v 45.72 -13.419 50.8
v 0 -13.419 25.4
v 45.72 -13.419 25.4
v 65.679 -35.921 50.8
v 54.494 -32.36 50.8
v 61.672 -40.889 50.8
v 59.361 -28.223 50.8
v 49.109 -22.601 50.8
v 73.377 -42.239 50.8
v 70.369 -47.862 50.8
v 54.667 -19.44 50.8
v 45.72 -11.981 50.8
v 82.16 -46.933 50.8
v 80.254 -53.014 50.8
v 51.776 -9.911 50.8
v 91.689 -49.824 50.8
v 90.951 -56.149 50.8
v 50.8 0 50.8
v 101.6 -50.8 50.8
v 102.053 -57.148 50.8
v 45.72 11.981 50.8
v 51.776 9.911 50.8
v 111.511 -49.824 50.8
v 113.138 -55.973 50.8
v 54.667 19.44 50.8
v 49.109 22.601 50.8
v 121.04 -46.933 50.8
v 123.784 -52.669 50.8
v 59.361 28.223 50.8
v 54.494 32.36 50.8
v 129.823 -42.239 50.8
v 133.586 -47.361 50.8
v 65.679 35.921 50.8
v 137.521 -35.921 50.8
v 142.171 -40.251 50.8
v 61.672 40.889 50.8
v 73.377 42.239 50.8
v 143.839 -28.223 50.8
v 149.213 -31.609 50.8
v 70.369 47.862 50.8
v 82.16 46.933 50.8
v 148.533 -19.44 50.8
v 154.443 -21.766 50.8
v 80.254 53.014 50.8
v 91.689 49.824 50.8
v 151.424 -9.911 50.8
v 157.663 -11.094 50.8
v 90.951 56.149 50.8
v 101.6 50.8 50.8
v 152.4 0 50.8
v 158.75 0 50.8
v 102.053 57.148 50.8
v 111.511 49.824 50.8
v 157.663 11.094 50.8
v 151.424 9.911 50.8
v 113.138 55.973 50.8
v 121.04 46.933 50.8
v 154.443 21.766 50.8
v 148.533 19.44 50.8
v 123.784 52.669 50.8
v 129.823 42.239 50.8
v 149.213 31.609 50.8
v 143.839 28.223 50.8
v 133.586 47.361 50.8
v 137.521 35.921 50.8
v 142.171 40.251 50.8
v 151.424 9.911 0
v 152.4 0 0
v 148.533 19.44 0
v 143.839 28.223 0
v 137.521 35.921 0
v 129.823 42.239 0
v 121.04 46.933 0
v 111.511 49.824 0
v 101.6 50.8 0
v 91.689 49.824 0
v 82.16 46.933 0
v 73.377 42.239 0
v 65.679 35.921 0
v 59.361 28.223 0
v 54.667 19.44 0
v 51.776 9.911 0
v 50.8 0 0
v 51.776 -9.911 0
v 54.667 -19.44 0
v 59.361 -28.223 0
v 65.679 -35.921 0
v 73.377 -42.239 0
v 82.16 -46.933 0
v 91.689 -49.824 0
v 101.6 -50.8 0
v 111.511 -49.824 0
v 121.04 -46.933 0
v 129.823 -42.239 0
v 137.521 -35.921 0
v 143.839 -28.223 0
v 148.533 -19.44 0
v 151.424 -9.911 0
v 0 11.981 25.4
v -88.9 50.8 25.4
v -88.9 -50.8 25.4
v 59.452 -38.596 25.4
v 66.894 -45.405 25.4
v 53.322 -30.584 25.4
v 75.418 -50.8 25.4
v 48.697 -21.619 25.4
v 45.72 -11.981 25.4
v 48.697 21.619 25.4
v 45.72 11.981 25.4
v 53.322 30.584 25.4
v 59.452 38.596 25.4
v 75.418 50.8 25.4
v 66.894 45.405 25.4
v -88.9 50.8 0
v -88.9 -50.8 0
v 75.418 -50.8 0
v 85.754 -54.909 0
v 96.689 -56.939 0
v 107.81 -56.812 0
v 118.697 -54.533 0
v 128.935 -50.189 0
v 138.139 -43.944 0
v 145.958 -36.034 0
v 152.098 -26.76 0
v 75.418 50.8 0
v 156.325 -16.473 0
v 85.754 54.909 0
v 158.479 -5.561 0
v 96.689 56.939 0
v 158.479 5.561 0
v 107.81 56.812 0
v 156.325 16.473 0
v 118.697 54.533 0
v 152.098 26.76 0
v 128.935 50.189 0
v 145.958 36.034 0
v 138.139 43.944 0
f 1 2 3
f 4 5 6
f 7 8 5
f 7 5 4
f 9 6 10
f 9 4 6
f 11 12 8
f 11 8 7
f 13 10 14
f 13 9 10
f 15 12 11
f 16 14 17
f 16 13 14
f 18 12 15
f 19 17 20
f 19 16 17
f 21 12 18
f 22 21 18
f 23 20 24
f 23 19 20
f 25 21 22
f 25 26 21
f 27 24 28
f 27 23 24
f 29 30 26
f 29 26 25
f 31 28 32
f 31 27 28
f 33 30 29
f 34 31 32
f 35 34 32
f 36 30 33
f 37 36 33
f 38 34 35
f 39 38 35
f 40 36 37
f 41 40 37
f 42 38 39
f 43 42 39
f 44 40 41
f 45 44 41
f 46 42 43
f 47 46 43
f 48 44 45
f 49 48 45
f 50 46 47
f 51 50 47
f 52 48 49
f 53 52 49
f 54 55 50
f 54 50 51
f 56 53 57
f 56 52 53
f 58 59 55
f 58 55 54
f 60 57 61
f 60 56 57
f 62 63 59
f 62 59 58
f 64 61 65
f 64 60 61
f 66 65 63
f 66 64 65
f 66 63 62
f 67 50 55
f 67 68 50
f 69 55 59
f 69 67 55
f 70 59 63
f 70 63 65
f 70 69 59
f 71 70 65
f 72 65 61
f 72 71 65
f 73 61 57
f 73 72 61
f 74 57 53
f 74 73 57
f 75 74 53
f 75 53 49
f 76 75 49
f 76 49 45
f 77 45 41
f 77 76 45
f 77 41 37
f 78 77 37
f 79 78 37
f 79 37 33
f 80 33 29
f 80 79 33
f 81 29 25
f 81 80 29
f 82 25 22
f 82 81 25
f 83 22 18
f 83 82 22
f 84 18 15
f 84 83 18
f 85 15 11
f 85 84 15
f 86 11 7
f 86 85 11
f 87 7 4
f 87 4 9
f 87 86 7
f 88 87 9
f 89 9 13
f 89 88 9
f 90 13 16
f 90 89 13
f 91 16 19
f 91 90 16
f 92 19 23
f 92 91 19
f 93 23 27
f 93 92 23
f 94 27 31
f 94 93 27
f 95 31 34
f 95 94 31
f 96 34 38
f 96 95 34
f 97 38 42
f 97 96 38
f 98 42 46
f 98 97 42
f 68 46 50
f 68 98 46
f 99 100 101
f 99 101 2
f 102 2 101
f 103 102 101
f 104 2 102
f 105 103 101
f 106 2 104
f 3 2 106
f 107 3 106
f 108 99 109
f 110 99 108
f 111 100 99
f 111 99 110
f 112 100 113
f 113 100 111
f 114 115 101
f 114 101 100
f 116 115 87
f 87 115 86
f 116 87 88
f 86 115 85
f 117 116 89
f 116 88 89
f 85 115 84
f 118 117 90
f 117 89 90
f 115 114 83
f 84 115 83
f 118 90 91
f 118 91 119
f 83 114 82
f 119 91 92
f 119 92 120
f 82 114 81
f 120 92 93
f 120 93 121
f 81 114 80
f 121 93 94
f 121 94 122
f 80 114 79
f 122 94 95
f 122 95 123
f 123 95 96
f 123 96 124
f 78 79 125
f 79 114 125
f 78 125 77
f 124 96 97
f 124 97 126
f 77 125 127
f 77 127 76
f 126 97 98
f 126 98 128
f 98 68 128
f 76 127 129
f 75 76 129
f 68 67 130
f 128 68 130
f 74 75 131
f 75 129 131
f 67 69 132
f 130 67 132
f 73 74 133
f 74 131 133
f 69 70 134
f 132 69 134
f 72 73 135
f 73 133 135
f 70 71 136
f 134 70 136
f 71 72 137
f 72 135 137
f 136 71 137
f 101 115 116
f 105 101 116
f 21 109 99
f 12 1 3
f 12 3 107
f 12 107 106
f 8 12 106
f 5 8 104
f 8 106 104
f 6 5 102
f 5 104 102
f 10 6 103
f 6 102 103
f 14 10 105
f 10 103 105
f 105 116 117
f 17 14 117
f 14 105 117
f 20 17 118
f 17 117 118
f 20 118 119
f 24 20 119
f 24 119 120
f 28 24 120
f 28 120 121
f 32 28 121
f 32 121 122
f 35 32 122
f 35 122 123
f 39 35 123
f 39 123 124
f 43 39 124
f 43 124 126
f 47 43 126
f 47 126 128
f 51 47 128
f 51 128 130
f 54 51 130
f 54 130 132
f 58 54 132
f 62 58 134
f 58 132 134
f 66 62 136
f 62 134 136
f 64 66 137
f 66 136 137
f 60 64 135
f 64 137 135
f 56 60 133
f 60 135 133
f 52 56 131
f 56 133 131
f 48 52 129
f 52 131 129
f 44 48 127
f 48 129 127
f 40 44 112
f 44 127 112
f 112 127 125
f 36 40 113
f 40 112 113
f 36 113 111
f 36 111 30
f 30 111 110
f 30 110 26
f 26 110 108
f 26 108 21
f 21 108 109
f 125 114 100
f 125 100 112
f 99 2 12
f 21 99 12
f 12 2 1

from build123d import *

# Parameters (mm, degrees)
F0_W     = 177.8
F0_H     = 101.6
F1_DEPTH = 25.4
F2_R     = 57.15
F2_R_2   = 50.8
F3_DEPTH = 50.8
F4_DEPTH = 25.4
F6_DEPTH = 25.4
F8_DEPTH = 25.4


with BuildPart() as f1:
    # F0 (on Top) → F1 (new body)
    with BuildSketch(Plane.XY):
        Rectangle(F0_W, F0_H)
    extrude(amount=F1_DEPTH)

    # F2 (on Top) → F3 (join)
    with BuildSketch(Plane.XY):
        with Locations((101.6, 0)):
            Circle(F2_R)
        with Locations((101.6, 0)):
            Circle(F2_R_2, mode=Mode.SUBTRACT)
    extrude(amount=F3_DEPTH)

    # F2 (on Top) + F3_face (on face) → F4 (cut)
    with BuildSketch(Plane.XY):
        with Locations((101.6, 0)):
            Circle(F2_R)
        with Locations((101.6, 0)):
            Circle(F2_R_2, mode=Mode.SUBTRACT)
    with BuildSketch(Plane(origin=(73.0309989911, 0, 25.4), x_dir=(1, 0, 0), z_dir=(0, 0, 1))):
        with BuildLine():
            ThreePointArc((15.8690010089, 49.1868884968), (-22.2309989911, 0), (15.8690010089, -49.1868884968))
            Line((15.8690010089, -49.1868884968), (15.8690010089, 49.1868884968))
        make_face()
    extrude(amount=-F4_DEPTH, mode=Mode.SUBTRACT)

    # F5 (on face) → F6 (join)
    with BuildSketch(Plane.XY.offset(25.4)):
        with BuildLine():
            Line((0, 11.9811560377), (0, -13.4188439623))
            Line((0, -13.4188439623), (45.72, -13.4188439623))
            Line((45.72, -13.4188439623), (45.72, -11.9811560377))
            ThreePointArc((45.72, -11.9811560377), (44.45, 0), (45.72, 11.9811560377))
            Line((45.72, 11.9811560377), (0, 11.9811560377))
        make_face()
    extrude(amount=F6_DEPTH)

    # F7 (on face) → F8 (cut)
    with BuildSketch(Plane.XZ.offset(13.4188439623)):
        Polygon((0, 25.4), (45.72, 50.8), (0, 50.8), align=None)
    extrude(amount=-F8_DEPTH, mode=Mode.SUBTRACT)


solid = f1.part
